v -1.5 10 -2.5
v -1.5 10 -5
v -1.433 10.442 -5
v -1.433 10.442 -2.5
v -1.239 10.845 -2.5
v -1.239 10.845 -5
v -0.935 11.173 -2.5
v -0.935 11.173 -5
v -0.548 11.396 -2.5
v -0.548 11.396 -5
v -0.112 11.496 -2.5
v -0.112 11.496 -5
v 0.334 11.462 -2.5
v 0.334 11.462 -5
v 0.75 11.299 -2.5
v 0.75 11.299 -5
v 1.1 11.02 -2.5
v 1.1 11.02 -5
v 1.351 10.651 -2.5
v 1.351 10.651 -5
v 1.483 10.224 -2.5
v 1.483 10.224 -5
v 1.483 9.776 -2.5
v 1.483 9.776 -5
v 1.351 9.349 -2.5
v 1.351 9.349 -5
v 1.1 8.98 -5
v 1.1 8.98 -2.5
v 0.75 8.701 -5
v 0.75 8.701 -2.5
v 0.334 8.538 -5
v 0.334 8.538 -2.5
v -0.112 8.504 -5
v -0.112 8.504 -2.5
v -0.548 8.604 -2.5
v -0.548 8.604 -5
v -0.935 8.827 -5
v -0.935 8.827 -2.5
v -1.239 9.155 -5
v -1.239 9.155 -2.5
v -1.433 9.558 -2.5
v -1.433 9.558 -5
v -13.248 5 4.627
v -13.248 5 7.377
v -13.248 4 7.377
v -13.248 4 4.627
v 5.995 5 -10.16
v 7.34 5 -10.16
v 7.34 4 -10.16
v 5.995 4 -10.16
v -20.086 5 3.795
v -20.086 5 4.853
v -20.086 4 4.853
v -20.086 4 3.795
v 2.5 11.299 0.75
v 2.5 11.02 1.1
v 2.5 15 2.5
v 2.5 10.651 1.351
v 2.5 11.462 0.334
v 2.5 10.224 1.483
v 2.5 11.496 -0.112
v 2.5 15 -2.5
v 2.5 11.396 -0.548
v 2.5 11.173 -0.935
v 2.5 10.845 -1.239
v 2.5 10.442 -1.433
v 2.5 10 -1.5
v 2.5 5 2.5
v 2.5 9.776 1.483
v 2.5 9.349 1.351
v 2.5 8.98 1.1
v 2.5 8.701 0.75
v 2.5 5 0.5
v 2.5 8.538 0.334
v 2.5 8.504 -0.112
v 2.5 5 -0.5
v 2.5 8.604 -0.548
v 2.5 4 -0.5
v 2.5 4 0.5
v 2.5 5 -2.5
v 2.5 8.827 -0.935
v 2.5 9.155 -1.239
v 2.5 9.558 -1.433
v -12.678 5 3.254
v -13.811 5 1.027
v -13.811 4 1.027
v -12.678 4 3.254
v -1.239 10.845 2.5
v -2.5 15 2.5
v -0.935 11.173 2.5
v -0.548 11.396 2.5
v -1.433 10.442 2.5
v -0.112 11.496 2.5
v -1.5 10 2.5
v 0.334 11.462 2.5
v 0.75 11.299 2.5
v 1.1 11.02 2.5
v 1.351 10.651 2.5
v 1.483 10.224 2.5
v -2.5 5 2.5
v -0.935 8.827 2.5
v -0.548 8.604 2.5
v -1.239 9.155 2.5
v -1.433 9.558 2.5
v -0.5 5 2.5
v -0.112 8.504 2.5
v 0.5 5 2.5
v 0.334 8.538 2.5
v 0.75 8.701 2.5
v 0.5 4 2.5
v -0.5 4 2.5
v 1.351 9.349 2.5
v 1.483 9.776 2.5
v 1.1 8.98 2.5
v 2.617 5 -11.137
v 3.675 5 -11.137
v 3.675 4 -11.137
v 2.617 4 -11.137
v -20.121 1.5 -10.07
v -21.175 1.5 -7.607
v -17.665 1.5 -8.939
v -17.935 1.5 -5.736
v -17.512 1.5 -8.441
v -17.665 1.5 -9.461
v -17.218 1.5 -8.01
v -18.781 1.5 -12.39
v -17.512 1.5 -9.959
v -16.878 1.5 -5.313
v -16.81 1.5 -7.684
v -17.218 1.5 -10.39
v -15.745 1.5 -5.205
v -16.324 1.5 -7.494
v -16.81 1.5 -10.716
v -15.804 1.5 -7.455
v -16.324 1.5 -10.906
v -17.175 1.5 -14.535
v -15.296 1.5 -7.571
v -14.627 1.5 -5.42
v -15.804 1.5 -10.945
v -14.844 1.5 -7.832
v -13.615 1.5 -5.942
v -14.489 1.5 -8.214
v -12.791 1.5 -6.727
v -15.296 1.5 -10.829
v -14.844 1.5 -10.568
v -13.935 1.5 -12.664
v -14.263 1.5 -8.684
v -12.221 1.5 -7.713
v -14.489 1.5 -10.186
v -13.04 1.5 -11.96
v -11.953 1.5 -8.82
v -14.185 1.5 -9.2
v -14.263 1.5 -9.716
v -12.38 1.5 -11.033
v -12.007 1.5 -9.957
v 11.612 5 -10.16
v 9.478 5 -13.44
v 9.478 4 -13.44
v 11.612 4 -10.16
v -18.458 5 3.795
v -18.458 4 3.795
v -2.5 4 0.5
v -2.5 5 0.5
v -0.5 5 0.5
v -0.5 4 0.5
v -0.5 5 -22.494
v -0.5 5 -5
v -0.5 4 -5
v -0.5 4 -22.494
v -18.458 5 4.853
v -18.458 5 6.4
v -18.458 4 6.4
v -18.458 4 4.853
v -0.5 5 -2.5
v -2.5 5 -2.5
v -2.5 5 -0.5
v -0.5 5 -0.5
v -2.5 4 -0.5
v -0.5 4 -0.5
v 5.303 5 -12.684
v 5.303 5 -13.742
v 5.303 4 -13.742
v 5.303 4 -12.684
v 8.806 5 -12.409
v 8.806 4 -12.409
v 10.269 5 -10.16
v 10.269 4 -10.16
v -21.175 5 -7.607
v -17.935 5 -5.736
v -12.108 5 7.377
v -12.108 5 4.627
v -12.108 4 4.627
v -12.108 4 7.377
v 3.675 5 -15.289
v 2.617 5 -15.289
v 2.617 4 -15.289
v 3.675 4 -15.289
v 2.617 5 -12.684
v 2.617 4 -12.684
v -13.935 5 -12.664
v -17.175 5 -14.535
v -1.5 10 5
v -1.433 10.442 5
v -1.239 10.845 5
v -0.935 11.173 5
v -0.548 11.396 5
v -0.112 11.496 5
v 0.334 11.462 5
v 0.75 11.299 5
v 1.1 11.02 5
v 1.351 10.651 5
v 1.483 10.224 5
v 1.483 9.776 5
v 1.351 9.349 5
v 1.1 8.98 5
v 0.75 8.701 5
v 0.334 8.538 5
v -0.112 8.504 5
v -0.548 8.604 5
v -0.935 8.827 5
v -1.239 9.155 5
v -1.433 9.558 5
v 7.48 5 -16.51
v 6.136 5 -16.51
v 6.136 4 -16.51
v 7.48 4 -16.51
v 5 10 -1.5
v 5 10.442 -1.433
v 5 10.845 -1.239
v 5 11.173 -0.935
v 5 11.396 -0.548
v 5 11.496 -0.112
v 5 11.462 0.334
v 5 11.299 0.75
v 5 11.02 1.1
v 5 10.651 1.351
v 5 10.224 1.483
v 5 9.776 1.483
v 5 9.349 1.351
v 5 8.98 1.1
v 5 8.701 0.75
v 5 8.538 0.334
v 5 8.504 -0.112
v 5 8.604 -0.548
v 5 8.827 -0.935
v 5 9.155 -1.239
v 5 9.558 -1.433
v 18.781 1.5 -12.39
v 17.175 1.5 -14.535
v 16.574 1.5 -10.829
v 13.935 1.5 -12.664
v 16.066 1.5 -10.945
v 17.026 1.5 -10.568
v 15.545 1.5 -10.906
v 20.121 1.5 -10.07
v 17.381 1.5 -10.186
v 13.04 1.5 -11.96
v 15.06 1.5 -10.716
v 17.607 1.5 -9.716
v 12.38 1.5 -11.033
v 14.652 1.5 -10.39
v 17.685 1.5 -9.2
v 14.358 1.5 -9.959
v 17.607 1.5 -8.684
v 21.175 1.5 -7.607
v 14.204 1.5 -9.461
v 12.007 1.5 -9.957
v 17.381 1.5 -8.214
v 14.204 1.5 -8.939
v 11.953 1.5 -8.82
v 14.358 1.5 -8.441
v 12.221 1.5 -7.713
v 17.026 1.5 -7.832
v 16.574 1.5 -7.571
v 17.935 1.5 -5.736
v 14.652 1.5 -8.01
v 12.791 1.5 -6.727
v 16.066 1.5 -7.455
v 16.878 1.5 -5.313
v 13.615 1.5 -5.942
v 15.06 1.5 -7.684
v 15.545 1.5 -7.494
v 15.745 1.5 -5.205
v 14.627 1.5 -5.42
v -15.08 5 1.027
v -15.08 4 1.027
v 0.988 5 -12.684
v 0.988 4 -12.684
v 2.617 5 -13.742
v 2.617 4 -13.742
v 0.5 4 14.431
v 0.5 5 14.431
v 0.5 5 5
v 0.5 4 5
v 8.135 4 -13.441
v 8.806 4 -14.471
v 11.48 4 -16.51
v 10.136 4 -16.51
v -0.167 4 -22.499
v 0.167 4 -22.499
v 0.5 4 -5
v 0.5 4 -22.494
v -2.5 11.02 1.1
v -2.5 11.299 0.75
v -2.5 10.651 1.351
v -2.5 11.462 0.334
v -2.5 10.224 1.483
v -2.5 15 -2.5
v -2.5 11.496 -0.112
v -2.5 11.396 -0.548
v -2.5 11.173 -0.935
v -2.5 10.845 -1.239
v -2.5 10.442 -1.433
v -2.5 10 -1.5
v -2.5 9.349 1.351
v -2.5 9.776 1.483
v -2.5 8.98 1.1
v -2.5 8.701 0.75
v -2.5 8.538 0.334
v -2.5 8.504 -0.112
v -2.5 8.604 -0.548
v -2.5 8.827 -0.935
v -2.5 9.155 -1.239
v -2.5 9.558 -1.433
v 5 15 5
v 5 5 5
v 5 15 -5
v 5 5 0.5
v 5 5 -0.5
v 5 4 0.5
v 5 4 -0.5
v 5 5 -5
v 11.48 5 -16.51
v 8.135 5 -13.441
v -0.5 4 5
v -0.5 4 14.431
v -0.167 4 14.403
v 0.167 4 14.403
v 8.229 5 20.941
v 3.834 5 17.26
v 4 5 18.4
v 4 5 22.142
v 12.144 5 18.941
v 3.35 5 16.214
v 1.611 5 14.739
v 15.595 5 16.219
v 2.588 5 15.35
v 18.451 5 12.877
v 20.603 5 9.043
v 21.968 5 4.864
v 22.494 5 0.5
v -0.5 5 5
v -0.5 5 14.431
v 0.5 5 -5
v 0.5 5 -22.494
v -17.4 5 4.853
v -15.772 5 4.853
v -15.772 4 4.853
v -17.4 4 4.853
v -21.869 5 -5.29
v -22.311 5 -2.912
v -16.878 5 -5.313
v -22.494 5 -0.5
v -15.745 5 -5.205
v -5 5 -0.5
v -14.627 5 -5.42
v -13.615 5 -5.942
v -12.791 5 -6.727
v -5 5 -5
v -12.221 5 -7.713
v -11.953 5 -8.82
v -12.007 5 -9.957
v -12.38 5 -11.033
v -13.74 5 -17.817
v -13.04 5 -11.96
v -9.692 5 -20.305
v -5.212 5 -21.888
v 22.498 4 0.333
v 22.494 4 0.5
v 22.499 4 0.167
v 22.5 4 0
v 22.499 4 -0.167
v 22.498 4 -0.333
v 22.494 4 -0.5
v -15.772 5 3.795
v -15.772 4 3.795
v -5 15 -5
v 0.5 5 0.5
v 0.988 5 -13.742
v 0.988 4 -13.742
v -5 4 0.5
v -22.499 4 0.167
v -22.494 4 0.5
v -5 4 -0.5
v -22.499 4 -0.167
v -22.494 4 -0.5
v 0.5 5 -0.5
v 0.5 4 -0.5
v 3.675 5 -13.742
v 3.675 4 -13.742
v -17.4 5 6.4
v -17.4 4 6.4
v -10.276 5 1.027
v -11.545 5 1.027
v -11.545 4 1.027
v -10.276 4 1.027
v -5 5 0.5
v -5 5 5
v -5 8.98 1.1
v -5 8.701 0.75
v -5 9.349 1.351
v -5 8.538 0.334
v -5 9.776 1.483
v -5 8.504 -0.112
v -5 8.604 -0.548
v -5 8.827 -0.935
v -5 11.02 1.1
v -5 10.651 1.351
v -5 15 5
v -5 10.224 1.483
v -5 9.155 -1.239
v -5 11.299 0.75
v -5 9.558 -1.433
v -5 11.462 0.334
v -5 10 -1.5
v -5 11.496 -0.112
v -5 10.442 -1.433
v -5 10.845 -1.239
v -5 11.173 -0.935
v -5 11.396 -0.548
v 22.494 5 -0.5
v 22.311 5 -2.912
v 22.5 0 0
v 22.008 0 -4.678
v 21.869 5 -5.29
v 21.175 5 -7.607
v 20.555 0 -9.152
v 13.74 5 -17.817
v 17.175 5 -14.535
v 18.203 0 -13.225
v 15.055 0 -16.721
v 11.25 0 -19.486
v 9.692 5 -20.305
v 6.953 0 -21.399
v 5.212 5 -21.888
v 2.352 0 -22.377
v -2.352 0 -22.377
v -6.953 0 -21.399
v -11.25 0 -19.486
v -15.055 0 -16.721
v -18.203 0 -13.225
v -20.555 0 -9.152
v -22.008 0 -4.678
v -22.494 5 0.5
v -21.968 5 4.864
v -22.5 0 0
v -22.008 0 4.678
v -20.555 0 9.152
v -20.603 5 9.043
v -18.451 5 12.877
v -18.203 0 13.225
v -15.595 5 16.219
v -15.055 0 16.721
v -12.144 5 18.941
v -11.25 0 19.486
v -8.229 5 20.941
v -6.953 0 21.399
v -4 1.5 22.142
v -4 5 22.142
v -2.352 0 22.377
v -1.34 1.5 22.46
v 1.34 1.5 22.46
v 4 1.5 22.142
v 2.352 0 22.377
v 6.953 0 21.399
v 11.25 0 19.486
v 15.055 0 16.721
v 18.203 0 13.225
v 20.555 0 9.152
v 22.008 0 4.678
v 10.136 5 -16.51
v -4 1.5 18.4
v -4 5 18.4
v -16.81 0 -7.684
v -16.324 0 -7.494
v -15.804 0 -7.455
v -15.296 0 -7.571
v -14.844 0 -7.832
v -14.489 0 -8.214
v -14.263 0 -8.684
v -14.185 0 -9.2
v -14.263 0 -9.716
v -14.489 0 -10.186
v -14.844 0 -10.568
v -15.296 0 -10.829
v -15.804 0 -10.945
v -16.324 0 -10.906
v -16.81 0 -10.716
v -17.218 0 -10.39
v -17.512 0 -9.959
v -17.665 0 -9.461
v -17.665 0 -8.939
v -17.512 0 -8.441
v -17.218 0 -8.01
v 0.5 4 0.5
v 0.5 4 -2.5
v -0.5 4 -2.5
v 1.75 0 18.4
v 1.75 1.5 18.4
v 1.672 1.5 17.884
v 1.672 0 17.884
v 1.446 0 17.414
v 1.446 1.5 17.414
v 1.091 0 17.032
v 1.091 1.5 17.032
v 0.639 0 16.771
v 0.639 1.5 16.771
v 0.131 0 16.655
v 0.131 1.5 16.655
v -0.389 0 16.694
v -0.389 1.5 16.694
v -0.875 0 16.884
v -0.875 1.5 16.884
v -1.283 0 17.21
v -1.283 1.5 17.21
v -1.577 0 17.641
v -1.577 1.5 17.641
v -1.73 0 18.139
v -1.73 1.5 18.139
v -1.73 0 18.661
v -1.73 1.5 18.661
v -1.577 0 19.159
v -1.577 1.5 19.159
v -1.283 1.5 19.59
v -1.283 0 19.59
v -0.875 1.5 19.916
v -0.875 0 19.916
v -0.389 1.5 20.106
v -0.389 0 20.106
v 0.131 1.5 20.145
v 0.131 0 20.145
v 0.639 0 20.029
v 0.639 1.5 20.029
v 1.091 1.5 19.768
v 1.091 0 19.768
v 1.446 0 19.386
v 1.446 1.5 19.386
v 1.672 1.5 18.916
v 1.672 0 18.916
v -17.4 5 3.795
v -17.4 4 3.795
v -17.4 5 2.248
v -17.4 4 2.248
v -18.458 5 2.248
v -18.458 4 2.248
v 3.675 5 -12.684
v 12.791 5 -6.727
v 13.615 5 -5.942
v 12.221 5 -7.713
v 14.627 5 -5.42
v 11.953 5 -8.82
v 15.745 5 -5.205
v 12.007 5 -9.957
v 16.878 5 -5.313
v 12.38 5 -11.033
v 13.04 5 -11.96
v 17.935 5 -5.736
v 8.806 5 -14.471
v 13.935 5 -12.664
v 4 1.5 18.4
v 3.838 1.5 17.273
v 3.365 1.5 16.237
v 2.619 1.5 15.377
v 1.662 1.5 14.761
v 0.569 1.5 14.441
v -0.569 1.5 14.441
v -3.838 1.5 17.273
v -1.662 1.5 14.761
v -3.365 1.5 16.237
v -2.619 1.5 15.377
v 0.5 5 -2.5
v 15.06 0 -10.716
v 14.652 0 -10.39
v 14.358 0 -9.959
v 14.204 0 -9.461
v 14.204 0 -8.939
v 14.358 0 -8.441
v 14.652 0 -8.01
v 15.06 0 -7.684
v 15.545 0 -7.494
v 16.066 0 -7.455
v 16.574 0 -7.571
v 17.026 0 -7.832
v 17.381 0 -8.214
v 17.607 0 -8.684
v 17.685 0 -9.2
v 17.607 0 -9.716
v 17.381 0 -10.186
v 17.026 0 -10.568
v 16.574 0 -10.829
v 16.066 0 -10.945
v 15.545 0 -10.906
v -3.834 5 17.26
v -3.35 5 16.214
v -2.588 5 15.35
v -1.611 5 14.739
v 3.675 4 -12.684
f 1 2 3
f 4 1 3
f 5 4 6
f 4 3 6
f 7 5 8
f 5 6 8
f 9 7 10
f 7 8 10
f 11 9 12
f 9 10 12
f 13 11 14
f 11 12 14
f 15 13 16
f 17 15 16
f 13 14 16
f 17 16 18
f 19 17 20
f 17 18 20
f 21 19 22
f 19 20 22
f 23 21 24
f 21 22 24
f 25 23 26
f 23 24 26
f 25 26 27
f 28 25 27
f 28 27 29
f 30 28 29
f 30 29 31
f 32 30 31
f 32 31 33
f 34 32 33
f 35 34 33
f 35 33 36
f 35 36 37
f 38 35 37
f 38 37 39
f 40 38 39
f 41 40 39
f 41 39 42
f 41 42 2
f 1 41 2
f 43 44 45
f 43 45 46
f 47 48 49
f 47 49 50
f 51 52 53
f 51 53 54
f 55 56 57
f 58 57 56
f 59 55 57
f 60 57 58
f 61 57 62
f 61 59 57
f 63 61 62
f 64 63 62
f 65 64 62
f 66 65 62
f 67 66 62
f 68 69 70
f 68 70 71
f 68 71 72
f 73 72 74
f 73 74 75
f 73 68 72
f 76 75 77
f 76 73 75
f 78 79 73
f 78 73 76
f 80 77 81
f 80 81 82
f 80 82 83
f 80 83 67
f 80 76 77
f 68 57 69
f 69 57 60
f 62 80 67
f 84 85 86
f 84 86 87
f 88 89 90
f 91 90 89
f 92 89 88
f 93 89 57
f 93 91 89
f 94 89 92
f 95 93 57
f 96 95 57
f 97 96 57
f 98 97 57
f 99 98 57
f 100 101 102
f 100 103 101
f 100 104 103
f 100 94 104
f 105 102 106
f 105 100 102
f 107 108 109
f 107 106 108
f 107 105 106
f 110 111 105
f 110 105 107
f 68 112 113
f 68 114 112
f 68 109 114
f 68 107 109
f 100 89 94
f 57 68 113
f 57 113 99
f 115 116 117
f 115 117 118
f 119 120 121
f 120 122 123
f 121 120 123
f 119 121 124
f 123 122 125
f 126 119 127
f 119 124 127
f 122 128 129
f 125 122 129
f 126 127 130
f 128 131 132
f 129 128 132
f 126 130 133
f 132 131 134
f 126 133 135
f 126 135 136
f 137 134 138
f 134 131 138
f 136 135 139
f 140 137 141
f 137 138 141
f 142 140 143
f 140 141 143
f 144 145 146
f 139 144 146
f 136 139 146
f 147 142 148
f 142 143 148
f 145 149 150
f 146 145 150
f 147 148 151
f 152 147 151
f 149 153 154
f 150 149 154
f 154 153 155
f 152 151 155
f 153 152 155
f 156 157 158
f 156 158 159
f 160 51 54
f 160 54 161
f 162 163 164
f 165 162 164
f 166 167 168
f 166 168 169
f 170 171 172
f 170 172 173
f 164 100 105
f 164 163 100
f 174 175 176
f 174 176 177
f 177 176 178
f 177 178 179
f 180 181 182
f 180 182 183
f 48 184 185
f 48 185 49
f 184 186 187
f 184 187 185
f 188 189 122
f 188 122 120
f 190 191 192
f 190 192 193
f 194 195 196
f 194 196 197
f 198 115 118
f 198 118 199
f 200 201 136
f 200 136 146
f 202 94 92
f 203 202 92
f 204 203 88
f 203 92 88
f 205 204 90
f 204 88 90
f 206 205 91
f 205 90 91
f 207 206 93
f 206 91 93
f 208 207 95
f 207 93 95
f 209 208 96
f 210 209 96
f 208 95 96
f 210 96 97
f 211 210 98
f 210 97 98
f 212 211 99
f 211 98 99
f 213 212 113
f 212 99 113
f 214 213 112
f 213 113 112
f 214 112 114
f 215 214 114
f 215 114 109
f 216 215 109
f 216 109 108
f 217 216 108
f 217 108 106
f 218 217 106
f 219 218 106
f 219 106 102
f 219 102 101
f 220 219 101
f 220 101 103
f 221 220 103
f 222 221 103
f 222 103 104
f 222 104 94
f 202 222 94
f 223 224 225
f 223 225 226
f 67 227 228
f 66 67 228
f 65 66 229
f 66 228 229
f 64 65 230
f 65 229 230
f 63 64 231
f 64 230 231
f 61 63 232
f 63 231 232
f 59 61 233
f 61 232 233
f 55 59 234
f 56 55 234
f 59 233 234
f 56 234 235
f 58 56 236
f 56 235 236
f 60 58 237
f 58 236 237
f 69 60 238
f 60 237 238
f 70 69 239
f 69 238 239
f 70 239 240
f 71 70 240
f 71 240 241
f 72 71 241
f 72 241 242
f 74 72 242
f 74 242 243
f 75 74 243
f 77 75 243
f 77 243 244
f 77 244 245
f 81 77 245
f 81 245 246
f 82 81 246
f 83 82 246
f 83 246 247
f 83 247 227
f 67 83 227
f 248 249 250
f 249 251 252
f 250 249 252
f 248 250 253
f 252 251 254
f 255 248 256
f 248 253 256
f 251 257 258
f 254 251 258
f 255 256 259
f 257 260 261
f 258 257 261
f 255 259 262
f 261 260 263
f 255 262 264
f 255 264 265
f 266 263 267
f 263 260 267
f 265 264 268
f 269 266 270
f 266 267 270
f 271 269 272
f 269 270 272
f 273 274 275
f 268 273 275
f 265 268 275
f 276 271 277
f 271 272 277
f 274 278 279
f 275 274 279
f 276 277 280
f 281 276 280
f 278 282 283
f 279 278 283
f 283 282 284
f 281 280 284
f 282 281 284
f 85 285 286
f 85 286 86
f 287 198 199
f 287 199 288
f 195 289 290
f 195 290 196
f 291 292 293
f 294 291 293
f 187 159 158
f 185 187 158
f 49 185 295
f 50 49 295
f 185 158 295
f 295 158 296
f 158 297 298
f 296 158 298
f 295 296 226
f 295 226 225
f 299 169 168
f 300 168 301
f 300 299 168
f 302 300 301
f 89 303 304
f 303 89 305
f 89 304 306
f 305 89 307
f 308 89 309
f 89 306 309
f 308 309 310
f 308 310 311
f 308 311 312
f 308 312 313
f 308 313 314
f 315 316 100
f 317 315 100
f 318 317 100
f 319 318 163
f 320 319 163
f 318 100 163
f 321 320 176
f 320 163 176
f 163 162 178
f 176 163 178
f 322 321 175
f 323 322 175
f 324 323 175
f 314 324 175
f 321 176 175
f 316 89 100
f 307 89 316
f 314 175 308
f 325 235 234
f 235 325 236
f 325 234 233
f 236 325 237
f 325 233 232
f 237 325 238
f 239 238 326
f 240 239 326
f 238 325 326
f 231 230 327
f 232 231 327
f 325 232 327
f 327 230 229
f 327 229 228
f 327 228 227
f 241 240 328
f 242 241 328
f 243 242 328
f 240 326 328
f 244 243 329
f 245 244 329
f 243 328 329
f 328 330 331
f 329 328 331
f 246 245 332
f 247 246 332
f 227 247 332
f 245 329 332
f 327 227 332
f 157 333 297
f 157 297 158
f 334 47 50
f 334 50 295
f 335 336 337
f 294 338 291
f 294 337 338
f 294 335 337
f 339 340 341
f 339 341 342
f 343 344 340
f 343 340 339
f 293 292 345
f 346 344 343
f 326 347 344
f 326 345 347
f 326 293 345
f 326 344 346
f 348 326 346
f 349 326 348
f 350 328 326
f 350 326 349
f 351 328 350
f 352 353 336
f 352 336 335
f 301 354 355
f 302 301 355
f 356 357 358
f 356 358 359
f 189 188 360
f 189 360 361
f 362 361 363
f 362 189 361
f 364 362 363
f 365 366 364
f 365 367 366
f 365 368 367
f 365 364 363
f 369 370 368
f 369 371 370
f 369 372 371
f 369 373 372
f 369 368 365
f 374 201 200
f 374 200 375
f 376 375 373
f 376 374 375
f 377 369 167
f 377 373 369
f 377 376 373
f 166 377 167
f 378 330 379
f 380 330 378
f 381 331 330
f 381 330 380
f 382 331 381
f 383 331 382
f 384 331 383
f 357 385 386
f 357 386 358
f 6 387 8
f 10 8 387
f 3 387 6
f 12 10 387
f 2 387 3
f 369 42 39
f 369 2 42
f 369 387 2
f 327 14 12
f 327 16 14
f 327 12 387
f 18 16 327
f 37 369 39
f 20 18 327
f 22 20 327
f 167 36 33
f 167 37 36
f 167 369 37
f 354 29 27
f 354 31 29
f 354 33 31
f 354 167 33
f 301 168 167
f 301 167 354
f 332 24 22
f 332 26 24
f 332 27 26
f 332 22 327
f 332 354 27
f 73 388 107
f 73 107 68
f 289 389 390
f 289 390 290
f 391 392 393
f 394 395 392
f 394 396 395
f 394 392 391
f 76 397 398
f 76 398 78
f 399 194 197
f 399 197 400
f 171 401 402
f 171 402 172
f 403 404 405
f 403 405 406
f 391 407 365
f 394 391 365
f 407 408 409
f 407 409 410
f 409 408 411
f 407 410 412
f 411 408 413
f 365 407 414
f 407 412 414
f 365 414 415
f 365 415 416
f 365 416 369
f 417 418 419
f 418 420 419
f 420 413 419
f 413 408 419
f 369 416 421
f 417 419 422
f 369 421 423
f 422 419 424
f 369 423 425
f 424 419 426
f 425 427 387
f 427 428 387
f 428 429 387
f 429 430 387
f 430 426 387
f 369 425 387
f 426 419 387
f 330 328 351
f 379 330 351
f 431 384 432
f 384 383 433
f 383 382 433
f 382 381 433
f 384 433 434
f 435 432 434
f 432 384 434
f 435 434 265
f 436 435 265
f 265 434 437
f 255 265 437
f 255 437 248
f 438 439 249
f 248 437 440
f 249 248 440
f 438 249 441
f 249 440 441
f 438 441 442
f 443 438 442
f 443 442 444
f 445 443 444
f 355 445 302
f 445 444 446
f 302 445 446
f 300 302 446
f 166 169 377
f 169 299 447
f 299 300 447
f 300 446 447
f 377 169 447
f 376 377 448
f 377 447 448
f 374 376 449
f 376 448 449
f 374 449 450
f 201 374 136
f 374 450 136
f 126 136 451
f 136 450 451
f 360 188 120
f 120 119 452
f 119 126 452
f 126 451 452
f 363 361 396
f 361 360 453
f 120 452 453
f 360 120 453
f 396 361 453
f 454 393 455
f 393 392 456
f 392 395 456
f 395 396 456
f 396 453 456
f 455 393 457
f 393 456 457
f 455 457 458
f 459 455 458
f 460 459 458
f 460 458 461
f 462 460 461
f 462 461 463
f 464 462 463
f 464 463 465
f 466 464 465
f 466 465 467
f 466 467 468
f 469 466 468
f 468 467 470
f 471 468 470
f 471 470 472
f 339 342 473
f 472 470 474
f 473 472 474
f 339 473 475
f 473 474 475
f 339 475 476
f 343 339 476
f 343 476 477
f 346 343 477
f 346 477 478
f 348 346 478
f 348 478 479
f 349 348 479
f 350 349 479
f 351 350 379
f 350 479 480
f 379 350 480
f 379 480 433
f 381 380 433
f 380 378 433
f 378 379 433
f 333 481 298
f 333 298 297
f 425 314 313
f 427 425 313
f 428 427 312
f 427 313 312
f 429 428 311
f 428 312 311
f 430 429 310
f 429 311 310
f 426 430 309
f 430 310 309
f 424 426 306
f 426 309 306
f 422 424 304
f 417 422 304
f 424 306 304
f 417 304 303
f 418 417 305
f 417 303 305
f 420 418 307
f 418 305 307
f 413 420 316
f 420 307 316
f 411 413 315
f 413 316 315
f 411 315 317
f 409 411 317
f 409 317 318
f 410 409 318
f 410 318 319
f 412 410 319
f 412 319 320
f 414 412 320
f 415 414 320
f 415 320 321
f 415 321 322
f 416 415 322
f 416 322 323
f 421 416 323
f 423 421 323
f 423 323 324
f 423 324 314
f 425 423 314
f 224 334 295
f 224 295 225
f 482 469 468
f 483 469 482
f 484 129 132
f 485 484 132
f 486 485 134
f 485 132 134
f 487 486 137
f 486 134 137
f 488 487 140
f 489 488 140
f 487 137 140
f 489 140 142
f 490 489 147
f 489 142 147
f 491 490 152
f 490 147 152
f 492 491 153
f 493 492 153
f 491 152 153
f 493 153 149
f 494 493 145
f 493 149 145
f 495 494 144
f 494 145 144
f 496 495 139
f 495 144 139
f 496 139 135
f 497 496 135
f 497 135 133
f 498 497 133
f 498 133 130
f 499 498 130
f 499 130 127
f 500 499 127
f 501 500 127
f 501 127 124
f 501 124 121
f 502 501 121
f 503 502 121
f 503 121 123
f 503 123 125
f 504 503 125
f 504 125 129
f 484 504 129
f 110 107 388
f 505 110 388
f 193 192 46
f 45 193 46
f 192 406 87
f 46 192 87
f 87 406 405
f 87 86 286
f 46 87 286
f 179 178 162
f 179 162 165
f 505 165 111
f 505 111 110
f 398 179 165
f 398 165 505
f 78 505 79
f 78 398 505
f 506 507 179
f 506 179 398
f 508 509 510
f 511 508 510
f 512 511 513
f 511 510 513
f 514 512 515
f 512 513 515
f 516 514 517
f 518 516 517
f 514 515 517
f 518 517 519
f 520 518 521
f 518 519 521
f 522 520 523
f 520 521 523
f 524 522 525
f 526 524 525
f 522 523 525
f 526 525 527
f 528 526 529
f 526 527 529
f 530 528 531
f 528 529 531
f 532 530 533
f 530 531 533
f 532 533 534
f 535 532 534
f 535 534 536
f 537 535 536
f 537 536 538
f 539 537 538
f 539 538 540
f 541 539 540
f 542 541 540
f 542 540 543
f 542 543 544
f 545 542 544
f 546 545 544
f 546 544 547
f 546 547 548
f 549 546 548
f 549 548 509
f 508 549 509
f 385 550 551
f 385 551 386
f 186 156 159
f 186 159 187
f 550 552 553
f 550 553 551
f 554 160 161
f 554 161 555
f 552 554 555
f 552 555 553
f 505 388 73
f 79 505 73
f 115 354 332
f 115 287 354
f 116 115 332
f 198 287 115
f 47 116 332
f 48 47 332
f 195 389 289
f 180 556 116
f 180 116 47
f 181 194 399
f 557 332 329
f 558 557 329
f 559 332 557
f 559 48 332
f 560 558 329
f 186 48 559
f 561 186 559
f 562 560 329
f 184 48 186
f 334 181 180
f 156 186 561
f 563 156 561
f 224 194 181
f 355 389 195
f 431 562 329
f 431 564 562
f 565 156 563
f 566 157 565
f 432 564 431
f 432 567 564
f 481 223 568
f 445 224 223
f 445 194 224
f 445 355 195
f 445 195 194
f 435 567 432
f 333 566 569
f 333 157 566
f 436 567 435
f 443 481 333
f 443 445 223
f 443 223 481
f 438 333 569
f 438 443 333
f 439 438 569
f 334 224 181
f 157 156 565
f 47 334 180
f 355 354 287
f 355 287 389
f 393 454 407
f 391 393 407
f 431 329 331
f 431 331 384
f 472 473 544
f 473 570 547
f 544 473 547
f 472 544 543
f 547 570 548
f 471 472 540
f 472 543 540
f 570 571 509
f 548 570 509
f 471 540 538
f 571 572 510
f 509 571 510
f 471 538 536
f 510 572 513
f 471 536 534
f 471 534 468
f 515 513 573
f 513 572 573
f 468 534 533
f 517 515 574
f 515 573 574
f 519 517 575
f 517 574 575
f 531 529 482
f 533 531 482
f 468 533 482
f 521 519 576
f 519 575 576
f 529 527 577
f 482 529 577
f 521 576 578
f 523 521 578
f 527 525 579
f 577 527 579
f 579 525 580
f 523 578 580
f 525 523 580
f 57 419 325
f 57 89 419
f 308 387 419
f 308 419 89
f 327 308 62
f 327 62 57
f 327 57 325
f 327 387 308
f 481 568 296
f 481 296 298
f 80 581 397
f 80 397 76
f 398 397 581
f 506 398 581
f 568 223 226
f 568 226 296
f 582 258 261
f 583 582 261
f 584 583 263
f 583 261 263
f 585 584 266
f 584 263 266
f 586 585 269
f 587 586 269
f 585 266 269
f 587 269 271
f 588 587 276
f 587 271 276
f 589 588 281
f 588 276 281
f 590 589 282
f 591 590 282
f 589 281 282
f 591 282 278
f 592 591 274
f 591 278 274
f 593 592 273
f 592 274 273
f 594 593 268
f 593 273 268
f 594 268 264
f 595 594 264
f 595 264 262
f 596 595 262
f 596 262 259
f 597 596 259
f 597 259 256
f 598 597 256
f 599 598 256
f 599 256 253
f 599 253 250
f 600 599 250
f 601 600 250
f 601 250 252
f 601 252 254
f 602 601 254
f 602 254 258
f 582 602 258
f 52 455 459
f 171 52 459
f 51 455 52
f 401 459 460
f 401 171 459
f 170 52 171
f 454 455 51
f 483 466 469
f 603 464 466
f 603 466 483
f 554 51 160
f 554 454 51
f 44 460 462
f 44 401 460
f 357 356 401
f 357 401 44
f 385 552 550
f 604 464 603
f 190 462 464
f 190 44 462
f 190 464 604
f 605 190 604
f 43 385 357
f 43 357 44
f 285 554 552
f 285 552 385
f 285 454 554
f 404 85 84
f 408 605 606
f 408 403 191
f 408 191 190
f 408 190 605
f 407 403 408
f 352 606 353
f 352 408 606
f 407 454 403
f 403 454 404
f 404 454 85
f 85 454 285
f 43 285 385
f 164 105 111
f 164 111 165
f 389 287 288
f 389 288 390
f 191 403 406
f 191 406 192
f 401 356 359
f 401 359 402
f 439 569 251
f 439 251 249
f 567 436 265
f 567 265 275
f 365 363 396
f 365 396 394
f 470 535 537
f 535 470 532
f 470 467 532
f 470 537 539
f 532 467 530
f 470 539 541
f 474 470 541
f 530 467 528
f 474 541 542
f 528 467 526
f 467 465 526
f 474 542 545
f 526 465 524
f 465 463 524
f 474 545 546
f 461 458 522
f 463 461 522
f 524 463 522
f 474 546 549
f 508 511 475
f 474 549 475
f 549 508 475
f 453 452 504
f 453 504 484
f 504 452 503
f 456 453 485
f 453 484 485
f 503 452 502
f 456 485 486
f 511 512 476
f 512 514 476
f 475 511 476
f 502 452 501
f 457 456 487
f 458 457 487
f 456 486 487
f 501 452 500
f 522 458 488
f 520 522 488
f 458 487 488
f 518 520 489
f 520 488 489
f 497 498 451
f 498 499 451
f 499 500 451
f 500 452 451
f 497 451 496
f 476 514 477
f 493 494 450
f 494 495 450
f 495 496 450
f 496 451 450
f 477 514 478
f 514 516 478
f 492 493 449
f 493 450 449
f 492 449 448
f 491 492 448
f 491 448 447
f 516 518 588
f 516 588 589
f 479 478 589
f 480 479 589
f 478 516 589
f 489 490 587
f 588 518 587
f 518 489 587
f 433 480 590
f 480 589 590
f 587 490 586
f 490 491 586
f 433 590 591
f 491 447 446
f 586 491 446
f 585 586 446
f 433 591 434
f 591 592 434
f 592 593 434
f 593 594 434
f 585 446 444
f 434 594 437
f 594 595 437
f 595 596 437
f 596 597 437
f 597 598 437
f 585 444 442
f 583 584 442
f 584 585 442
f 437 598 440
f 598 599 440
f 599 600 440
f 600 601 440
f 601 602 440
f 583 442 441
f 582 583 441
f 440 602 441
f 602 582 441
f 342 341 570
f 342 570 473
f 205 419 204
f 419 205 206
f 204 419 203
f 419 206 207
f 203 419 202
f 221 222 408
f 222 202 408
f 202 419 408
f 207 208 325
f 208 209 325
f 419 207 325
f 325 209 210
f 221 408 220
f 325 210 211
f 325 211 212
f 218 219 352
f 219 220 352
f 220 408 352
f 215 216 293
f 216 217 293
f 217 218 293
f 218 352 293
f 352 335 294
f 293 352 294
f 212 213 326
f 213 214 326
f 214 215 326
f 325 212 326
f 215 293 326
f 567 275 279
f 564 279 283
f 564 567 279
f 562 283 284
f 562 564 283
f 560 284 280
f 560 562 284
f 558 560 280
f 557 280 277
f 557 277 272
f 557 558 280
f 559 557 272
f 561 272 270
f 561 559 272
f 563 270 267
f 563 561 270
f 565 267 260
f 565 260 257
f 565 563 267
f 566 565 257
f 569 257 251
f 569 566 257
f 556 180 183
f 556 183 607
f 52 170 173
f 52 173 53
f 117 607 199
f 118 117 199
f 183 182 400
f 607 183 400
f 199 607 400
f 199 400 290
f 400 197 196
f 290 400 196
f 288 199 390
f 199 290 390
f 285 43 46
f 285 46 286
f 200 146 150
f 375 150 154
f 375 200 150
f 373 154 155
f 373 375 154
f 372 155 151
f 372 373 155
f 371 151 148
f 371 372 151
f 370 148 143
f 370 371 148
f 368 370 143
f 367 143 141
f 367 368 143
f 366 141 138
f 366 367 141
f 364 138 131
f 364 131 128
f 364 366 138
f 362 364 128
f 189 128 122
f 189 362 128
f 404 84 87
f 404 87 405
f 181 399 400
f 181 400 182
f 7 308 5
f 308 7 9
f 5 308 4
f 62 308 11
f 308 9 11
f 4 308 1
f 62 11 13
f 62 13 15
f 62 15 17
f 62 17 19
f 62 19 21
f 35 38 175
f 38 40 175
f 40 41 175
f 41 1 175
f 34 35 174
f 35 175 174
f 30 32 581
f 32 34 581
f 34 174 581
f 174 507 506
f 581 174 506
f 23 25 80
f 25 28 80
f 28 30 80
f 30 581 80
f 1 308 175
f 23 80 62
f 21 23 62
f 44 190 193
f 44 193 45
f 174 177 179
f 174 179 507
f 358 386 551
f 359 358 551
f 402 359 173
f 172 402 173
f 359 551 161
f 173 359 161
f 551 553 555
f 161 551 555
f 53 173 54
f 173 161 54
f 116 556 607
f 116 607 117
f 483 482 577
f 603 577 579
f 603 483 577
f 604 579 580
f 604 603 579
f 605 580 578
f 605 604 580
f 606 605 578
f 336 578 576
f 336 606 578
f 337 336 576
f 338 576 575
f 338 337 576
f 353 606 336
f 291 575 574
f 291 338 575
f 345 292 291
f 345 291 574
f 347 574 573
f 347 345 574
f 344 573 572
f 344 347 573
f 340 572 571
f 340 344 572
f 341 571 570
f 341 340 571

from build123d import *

# Parameters (mm, degrees)
SKETCH1_R                     = 22.5
PLATE_DEPTH                   = 5
OPENING_START                 = 1.5
OPENING_FOR_SCREW_DEPTH       = 5
SKETCH7_R                     = 1.75
SCREW_HOLE_DEPTH              = 5
CIRPATTERN20_COUNT            = 3
SKETCH10_W                    = 45
SKETCH10_H                    = 1
SKETCH10_W_2                  = 1
SKETCH10_H_2                  = 45
CUT_EXTRUDE5_DEPTH            = 1
CUT_EXTRUDE6_DEPTH            = 1
SKETCH12_W                    = 10
SKETCH12_H                    = 10
SKETCH12_W_2                  = 5
SKETCH12_H_2                  = 5
TOOL_CONNECT_PIECE_DEPTH      = 10
TOOL_CONNECT_PIECE_DEPTH_BACK = 1
SKETCH14_R                    = 1.5
CUT_EXTRUDE8_DEPTH            = 10
SKETCH15_R                    = 1.5
CUT_EXTRUDE9_DEPTH            = 28.5


with BuildPart() as part:
    # Sketch1 → plate (new body)
    with BuildSketch(Plane(origin=(0, 0, 0), x_dir=(1, 0, 0), z_dir=(0, 1, 0))):
        Circle(SKETCH1_R)
    extrude(amount=PLATE_DEPTH)

    # Sketch6 → opening for screw (cut)
    with BuildSketch(Plane(origin=(0, 5, 0), x_dir=(1, 0, 0), z_dir=(0, 1, 0)).offset(OPENING_START)):
        with BuildLine():
            Line((-4, -22.5), (-4, -18.4))
            ThreePointArc((-4, -18.4), (0, -14.4), (4, -18.4))
            Line((4, -18.4), (4, -22.5))
            ThreePointArc((4, -22.5), (0, -26.5), (-4, -22.5))
        make_face()
    opening_for_screw = extrude(amount=-OPENING_FOR_SCREW_DEPTH, mode=Mode.SUBTRACT)

    # Sketch7 → screw hole (cut)
    with BuildSketch(Plane(origin=(0, 1.5, 0), x_dir=(1, 0, 0), z_dir=(0, 1, 0))):
        with Locations((0, -18.4)):
            Circle(SKETCH7_R)
    screw_hole = extrude(amount=-SCREW_HOLE_DEPTH, mode=Mode.SUBTRACT)

    # CirPattern20: opening for screw, screw hole ×3 about axis
    cirpattern20_axis = Axis((0, 0, 0), (0, 1, 0))
    for i in range(1, CIRPATTERN20_COUNT):
        add(opening_for_screw.rotate(cirpattern20_axis, i * 360 / CIRPATTERN20_COUNT), mode=Mode.SUBTRACT)
        add(screw_hole.rotate(cirpattern20_axis, i * 360 / CIRPATTERN20_COUNT), mode=Mode.SUBTRACT)

    # Sketch10 → Cut-Extrude5 (cut)
    with BuildSketch(Plane(origin=(0, 5, 0), x_dir=(1, 0, 0), z_dir=(0, 1, 0))):
        Rectangle(SKETCH10_W, SKETCH10_H)
        Rectangle(SKETCH10_W_2, SKETCH10_H_2)
    extrude(amount=-CUT_EXTRUDE5_DEPTH, mode=Mode.SUBTRACT)

    # Sketch11 → Cut-Extrude6 (cut)
    with BuildSketch(Plane(origin=(0, 5, 0), x_dir=(1, 0, 0), z_dir=(0, 1, 0))):
        Polygon((2.616666667, 13.742425761), (2.616666667, 15.289220632), (3.675, 15.289220632), (3.675, 13.742425761), (5.303205128, 13.742425761), (5.303205128, 12.684092427), (3.675, 12.684092427), (3.675, 11.137297556), (2.616666667, 11.137297556), (2.616666667, 12.684092427), (0.988461538, 12.684092427), (0.988461538, 13.742425761), align=None)
        Polygon((6.136388221, 16.510374479), (7.479657452, 16.510374479), (8.806390224, 14.471301963), (10.135667067, 16.510374479), (11.480208333, 16.510374479), (9.47802484, 13.43968137), (11.6125, 10.160374479), (10.269230769, 10.160374479), (8.806390224, 12.409332812), (7.339733574, 10.160374479), (5.995192308, 10.160374479), (8.134755609, 13.440953405), align=None)
        Polygon((-18.458103671, -3.794817635), (-18.458103671, -2.248022763), (-17.399770338, -2.248022763), (-17.399770338, -3.794817635), (-15.771565209, -3.794817635), (-15.771565209, -4.853150968), (-17.399770338, -4.853150968), (-17.399770338, -6.39994584), (-18.458103671, -6.39994584), (-18.458103671, -4.853150968), (-20.086308799, -4.853150968), (-20.086308799, -3.794817635), align=None)
        Polygon((-15.07957803, -1.026868917), (-13.811358879, -1.026868917), (-12.677975466, -3.254202651), (-11.544592052, -1.026868917), (-10.276372902, -1.026868917), (-12.108103671, -4.626728693), (-12.108103671, -7.376868917), (-13.247847261, -7.376868917), (-13.247847261, -4.626728693), align=None)
    extrude(amount=-CUT_EXTRUDE6_DEPTH, mode=Mode.SUBTRACT)

    # Sketch12 → tool connect piece (add, two sides)
    with BuildSketch(Plane(origin=(0, 5, 0), x_dir=(1, 0, 0), z_dir=(0, 1, 0))) as tool_connect_piece_sk:
        Rectangle(SKETCH12_W, SKETCH12_H)
        Rectangle(SKETCH12_W_2, SKETCH12_H_2, mode=Mode.SUBTRACT)
    extrude(amount=TOOL_CONNECT_PIECE_DEPTH)
    extrude(tool_connect_piece_sk.sketch, amount=-TOOL_CONNECT_PIECE_DEPTH_BACK)

    # Sketch14 → Cut-Extrude8 (cut)
    with BuildSketch(Plane(origin=(0, 0, -5), x_dir=(-1, 0, 0), z_dir=(0, 0, -1))):
        with Locations((0, 10)):
            Circle(SKETCH14_R)
    extrude(amount=-CUT_EXTRUDE8_DEPTH, mode=Mode.SUBTRACT)

    # Sketch15 → Cut-Extrude9 (cut, through all)
    with BuildSketch(Plane(origin=(5, 0, 0), x_dir=(0, 0, -1), z_dir=(1, 0, 0))):
        with Locations((0, 10)):
            Circle(SKETCH15_R)
    extrude(amount=-CUT_EXTRUDE9_DEPTH, mode=Mode.SUBTRACT)


solid = part.part
